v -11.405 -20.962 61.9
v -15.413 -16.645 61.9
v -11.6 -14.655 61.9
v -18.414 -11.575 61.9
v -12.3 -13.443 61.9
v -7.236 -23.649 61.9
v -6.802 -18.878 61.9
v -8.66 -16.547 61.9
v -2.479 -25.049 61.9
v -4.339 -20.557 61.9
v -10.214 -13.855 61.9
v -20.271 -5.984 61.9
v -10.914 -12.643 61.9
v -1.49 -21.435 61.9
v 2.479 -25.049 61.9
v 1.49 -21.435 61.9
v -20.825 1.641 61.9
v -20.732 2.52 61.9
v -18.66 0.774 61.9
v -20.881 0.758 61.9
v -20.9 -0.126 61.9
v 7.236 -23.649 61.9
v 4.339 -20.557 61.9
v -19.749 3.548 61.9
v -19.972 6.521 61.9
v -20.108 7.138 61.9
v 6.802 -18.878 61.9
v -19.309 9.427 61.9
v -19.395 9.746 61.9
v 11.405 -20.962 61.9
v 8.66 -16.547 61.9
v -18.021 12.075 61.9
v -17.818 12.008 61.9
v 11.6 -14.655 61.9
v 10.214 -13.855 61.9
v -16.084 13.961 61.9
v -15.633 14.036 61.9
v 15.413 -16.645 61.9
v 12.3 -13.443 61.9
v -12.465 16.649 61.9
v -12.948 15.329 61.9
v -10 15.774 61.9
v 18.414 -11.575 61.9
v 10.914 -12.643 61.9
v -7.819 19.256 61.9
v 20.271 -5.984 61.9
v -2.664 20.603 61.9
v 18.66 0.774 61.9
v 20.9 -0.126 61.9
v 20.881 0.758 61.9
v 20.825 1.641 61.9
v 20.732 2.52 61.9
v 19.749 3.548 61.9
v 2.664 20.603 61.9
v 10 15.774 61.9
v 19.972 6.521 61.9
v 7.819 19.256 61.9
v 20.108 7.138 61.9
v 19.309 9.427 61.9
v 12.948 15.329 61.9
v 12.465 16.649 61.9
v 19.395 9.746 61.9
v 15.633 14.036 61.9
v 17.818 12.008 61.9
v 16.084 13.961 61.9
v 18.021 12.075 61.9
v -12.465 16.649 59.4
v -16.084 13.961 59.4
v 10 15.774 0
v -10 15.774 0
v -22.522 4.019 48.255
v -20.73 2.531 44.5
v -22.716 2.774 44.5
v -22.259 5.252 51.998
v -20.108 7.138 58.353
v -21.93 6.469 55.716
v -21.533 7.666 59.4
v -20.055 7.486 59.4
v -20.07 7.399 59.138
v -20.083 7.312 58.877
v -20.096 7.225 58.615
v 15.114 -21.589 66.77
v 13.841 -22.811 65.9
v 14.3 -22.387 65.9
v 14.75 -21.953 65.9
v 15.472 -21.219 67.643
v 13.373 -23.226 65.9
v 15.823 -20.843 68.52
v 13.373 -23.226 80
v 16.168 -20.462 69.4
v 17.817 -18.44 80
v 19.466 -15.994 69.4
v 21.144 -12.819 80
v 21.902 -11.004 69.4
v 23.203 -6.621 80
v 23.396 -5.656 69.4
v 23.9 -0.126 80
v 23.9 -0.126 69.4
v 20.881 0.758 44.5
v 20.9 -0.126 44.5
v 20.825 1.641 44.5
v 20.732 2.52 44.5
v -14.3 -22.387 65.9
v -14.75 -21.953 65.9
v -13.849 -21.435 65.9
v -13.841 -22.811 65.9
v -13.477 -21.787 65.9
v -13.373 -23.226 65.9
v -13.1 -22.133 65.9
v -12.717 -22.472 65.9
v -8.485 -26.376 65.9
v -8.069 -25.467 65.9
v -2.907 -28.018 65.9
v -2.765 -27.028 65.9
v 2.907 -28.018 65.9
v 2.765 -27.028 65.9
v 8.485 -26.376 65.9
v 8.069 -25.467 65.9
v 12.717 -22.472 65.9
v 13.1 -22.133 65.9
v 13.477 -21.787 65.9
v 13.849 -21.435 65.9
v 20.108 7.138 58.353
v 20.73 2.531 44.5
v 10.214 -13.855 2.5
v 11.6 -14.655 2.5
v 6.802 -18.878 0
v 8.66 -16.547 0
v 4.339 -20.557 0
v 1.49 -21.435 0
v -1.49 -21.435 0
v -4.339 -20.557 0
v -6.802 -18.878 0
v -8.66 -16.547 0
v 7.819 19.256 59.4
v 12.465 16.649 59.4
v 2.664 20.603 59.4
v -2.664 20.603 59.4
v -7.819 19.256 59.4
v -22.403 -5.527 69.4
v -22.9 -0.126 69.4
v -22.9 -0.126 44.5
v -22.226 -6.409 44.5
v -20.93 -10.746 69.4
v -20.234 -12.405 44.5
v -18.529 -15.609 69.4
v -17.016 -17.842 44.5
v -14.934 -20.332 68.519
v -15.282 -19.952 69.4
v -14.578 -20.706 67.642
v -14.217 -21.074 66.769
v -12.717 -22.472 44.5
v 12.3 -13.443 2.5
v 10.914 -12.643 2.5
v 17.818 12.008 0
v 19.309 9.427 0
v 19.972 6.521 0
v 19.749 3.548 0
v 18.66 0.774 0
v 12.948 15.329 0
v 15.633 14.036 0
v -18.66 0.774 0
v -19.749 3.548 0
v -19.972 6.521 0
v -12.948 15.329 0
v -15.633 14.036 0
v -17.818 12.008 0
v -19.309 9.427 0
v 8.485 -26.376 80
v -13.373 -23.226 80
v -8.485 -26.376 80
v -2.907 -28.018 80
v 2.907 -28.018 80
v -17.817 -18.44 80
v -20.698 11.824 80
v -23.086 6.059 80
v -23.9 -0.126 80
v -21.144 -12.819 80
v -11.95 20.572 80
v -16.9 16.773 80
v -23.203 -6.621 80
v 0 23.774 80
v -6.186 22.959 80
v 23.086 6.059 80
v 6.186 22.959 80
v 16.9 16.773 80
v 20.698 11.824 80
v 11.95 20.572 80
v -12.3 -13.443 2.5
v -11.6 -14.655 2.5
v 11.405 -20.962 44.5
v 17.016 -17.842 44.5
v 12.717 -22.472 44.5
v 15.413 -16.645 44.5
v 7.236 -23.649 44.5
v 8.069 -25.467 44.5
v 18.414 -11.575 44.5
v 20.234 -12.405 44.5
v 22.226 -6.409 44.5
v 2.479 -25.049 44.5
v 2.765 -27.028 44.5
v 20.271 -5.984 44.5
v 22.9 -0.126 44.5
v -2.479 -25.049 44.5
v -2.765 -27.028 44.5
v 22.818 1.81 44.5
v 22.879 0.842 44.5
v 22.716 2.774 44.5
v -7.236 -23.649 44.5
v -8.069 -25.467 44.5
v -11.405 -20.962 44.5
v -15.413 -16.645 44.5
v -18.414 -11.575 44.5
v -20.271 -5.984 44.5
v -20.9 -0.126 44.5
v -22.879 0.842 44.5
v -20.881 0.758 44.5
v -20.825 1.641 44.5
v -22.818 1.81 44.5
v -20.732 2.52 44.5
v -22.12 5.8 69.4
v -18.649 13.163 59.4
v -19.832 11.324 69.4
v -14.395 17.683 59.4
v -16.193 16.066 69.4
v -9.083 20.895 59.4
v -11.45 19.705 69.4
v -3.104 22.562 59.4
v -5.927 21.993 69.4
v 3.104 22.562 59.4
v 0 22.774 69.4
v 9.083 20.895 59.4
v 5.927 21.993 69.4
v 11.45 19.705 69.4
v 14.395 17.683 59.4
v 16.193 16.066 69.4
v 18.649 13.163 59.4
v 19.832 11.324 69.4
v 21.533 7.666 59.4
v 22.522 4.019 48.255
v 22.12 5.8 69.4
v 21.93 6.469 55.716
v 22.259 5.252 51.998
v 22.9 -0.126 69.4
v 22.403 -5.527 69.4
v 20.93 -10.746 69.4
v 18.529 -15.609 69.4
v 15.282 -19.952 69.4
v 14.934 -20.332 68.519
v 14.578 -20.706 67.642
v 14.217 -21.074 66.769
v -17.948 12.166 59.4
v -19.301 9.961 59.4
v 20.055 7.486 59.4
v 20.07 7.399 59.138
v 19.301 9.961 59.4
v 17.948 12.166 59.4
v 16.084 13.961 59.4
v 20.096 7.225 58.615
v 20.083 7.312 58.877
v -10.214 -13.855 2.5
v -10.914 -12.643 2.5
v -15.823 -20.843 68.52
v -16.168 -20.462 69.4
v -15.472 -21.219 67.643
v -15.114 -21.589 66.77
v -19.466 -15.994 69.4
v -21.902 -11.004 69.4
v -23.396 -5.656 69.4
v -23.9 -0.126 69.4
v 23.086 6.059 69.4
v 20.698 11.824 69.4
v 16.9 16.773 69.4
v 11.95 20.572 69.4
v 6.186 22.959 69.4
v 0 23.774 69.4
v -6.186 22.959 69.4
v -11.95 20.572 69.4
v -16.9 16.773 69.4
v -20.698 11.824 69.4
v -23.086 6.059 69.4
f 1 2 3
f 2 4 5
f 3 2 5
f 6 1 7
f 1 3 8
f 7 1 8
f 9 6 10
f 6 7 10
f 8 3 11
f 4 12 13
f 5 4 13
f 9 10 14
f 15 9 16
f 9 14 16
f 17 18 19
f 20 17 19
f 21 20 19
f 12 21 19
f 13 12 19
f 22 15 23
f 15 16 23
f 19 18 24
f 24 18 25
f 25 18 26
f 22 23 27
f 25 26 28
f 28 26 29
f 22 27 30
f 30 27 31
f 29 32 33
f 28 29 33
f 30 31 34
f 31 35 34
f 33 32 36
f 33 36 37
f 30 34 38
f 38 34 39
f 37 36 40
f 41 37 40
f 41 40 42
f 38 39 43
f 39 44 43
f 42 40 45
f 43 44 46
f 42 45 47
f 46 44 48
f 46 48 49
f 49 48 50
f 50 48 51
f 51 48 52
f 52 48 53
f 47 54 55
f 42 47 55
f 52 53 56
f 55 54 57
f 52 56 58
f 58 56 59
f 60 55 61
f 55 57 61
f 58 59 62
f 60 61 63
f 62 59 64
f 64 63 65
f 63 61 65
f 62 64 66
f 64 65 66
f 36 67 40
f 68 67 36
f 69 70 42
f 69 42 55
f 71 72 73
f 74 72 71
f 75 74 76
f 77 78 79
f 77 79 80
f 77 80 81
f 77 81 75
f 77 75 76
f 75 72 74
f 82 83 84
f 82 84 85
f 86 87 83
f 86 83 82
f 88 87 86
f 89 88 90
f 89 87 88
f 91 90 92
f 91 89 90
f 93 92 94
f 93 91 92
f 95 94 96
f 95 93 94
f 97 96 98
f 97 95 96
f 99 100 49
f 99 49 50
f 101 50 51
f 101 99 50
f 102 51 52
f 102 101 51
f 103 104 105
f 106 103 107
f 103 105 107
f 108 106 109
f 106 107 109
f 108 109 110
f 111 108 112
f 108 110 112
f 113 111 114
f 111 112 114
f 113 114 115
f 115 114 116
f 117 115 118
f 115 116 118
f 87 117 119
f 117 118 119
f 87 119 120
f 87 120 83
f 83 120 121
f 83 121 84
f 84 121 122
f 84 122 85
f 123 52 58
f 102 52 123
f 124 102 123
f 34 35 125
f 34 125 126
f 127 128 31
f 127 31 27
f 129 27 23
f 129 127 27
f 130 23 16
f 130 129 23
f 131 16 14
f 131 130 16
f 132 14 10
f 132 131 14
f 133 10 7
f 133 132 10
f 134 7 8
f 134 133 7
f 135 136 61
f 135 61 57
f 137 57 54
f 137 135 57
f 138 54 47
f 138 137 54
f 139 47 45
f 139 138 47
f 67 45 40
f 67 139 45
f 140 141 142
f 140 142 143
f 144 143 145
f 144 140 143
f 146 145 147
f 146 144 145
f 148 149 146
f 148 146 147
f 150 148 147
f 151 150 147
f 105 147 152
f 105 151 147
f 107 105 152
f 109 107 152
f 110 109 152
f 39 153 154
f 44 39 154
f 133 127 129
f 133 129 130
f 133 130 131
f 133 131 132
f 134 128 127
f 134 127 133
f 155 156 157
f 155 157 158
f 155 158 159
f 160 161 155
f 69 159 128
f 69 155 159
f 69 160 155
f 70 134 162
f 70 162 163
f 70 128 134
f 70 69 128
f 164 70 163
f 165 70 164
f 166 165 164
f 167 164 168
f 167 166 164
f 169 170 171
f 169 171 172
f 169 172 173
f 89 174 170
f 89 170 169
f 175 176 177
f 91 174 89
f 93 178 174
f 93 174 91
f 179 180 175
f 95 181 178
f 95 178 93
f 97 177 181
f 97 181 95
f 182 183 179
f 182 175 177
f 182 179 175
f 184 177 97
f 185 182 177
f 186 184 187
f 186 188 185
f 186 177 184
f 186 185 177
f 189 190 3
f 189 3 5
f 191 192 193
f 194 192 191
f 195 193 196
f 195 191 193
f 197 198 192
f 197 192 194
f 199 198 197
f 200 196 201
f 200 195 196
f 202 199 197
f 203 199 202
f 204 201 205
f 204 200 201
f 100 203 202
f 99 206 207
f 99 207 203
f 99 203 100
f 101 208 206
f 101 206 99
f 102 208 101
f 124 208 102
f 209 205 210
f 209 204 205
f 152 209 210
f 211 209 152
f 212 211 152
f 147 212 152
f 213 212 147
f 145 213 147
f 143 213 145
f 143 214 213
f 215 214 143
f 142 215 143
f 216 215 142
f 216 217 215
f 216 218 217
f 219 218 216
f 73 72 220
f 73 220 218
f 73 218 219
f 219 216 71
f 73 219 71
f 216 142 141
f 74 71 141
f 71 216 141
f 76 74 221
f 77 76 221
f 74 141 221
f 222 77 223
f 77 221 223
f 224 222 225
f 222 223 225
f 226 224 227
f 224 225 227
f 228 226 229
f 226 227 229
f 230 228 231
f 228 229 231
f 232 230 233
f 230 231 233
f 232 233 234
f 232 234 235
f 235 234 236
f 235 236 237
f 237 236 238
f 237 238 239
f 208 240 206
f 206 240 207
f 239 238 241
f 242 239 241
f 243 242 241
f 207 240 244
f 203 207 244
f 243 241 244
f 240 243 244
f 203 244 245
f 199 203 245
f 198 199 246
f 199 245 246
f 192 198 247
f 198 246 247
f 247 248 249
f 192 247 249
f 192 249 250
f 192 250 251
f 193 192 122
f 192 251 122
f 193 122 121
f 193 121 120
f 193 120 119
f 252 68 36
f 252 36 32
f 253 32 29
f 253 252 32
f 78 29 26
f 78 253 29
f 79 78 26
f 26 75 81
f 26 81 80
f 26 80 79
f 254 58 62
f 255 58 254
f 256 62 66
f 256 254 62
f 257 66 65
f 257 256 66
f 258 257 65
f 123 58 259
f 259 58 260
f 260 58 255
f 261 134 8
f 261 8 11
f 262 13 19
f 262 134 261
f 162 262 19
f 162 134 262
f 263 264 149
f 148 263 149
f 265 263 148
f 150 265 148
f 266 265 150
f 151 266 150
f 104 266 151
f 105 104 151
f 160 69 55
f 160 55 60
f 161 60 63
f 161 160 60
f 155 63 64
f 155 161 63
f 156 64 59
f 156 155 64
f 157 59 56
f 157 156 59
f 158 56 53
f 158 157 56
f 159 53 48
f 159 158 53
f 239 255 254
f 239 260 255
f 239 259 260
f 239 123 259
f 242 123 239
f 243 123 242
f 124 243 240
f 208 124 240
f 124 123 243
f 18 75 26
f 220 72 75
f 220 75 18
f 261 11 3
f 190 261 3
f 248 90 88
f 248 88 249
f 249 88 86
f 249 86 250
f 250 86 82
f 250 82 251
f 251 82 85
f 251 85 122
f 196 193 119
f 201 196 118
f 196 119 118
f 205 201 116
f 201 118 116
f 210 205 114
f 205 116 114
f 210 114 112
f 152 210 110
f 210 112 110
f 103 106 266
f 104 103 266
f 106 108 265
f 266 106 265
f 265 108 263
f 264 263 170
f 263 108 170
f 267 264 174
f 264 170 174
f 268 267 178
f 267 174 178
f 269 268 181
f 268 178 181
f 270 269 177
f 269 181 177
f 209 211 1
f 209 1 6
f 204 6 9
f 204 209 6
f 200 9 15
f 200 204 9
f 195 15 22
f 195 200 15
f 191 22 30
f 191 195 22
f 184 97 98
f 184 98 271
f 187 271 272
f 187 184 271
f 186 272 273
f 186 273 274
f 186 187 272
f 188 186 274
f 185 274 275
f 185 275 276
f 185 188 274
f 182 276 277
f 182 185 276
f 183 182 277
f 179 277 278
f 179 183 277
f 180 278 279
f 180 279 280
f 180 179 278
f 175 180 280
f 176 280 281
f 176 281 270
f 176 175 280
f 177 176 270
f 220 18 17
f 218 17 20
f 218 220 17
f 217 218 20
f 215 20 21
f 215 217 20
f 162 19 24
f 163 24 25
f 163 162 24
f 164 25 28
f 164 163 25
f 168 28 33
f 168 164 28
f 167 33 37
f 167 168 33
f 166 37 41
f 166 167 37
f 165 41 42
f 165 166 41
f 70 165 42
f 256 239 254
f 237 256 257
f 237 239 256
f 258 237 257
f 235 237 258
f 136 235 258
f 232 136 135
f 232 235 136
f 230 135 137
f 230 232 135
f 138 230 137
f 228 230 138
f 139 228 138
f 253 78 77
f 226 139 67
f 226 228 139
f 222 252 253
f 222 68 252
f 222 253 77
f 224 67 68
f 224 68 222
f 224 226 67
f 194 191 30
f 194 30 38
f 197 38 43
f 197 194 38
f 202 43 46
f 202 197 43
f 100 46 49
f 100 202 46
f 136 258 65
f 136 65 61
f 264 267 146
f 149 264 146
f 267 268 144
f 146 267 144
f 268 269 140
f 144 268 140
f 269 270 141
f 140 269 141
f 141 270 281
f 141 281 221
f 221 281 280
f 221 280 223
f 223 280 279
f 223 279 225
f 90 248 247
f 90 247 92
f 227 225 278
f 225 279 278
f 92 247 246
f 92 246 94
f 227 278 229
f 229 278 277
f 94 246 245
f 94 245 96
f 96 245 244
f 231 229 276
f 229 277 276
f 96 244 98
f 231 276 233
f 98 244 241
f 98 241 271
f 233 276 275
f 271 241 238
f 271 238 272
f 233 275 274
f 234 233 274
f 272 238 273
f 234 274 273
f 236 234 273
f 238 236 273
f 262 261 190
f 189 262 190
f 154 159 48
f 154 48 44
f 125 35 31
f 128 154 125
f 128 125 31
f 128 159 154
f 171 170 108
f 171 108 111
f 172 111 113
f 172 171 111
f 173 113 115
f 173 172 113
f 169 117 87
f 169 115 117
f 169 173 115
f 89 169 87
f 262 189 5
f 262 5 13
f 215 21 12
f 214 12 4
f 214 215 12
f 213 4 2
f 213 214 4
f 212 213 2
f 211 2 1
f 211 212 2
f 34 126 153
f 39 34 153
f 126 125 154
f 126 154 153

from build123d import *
from OCP.BRepFilletAPI import BRepFilletAPI_MakeChamfer

# Parameters (mm, degrees)
BOSS_EXTRU_1_DEPTH      = 80
BOSS_EXTRU_2_DEPTH      = 10.6
BOSS_EXTRU_3_DEPTH      = 10
BOSS_EXTRU_4_DEPTH      = 3.5
CHANFREIN1_SIZE         = 2
CHANFREIN1_SIZE_2       = 3.5
BOSS_EXTRU_5_DEPTH      = 14.9
CHANFREIN2_SIZE         = 5
CHANFREIN2_SIZE_2       = 14.9
ENL_V_MAT_EXTRU_1_DEPTH = 61.9
BOSS_EXTRU_8_REACH      = 92.636
BOSS_EXTRU_8_START      = -2.5


with BuildPart() as part:
    # Esquisse1 → Boss.-Extru.1 (new body)
    with BuildSketch(Plane.XY):
        with BuildLine():
            Line((-9.999999999999973, 15.773502691896244), (9.999999999999973, 15.773502691896244))
            ThreePointArc((9.999999999999973, 15.773502691896244), (18.66025403784436, 10.773502691896228), (18.66025403784438, 0.7735026918962024))
            Line((18.66025403784438, 0.7735026918962024), (8.660254037844393, -16.54700538379251))
            ThreePointArc((8.660254037844393, -16.54700538379251), (-4.87e-15, -21.5470053837925), (-8.660254037844393, -16.54700538379251))
            Line((-8.660254037844393, -16.54700538379251), (-18.66025403784438, 0.7735026918962024))
            ThreePointArc((-18.66025403784438, 0.7735026918962024), (-18.66025403784441, 10.773502691896235), (-9.999999999999973, 15.773502691896244))
        make_face()
    extrude(amount=BOSS_EXTRU_1_DEPTH)

    # Esquisse2 → Boss.-Extru.2 (add)
    with BuildSketch(Plane.XY.offset(80)):
        with BuildLine():
            Line((0, 23.773502691896258), (0, -28.226497308103742))
            ThreePointArc((0, -28.226497308103742), (-7.138520611844601, -26.935621886911633), (-13.372879499304581, -23.22649730810374))
            ThreePointArc((-13.372879499304581, -23.22649730810374), (-21.14415675858487, -12.819312855059437), (-23.89999999999999, -0.12649730810374363))
            ThreePointArc((-23.89999999999999, -0.12649730810374363), (-16.89985207035848, 16.773354762254744), (0, 23.773502691896258))
        make_face()
    boss_extru_2 = extrude(amount=-BOSS_EXTRU_2_DEPTH)

    # Symétrie1: Boss.-Extru.2 across plane
    add(boss_extru_2.mirror(Plane(origin=(0, 0, 0), x_dir=(0, 0, 1), z_dir=(1, 0, 0))))

    # Esquisse4 → Boss.-Extru.3 (add)
    with BuildSketch(Plane(origin=(0, 0, 69.4), x_dir=(-1, 0, 0), z_dir=(0, 0, -1))):
        with BuildLine():
            ThreePointArc((-12.716812029717252, -22.471795065262707), (-2.04e-15, -27.226497308103735), (12.71681202971725, -22.4717950652627))
            ThreePointArc((12.71681202971725, -22.4717950652627), (20.2341931687673, -12.404624700892555), (22.899999999999995, -0.12649730810373652))
            ThreePointArc((22.899999999999995, -0.12649730810373652), (-6.91e-15, 22.773502691896258), (-22.899999999999995, -0.12649730810373735))
            ThreePointArc((-22.899999999999995, -0.12649730810373735), (-20.234193168767305, -12.404624700892553), (-12.716812029717252, -22.471795065262707))
        make_face()
    extrude(amount=BOSS_EXTRU_3_DEPTH)

    # Esquisse6 → Boss.-Extru.4 (add)
    with BuildSketch(Plane(origin=(0, 0, 69.4), x_dir=(-1, 0, 0), z_dir=(0, 0, -1))):
        with BuildLine():
            Line((14.75, -21.95321690393977), (0, -13.476497308103742))
            Line((0, -13.476497308103742), (0, -28.226497308103742))
            ThreePointArc((0, -28.226497308103742), (7.138520611844594, -26.935621886911633), (13.372879499304576, -23.226497308103735))
            ThreePointArc((13.372879499304576, -23.226497308103735), (14.071194795630928, -22.600407707254973), (14.75, -21.95321690393977))
        make_face()
    boss_extru_4 = extrude(amount=BOSS_EXTRU_4_DEPTH)

    # Symétrie2: Boss.-Extru.4 across plane
    add(boss_extru_4.mirror(Plane(origin=(0, 0, 0), x_dir=(0, 0, 1), z_dir=(1, 0, 0))))

    # Chanfrein1
    chanfrein1_edges_1 = [part.edges().sort_by_distance(p)[0] for p in [
        (-14.299309891443901, -21.69420851920438, 69.4),
    ]]
    chanfrein1_side_1 = [part.faces().sort_by_distance(p)[0] for p in [
        (-14.319240730556658, -21.659527664943543, 69.4),
    ]]
    chanfrein1_edges_2 = [part.edges().sort_by_distance(p)[0] for p in [
        (14.299309891443906, -21.694208519204384, 69.4),
    ]]
    chanfrein1_side_2 = [part.faces().sort_by_distance(p)[0] for p in [
        (14.319240730556663, -21.659527664943546, 69.4),
    ]]
    chanfrein1 = BRepFilletAPI_MakeChamfer(part.part.solid().wrapped)
    for e in chanfrein1_edges_1:
        chanfrein1.Add(CHANFREIN1_SIZE - 0.0001, CHANFREIN1_SIZE_2 - 0.0001, e.wrapped, chanfrein1_side_1[0].wrapped)
    for e in chanfrein1_edges_2:
        chanfrein1.Add(CHANFREIN1_SIZE - 0.0001, CHANFREIN1_SIZE_2 - 0.0001, e.wrapped, chanfrein1_side_2[0].wrapped)
    add(Compound.cast(chanfrein1.Shape()), mode=Mode.REPLACE)  # a hair under: the kernel refuses the full size

    # Esquisse7 → Boss.-Extru.5 (add)
    with BuildSketch(Plane(origin=(0, 0, 59.4), x_dir=(-1, 0, 0), z_dir=(0, 0, -1))):
        with BuildLine():
            Line((-6.79e-15, -27.22649730810374), (0, 0))
            Line((0, 0), (22.71563338320109, 2.7735026918962267))
            ThreePointArc((22.71563338320109, 2.7735026918962267), (22.853861867037974, 1.3264299999015228), (22.899999999999995, -0.12649730810374016))
            ThreePointArc((22.899999999999995, -0.12649730810374016), (20.2341931687673, -12.404624700892562), (12.716812029717245, -22.471795065262707))
            ThreePointArc((12.716812029717245, -22.471795065262707), (6.788307992740876, -25.998951656029643), (-6.79e-15, -27.22649730810374))
        make_face()
    boss_extru_5 = extrude(amount=BOSS_EXTRU_5_DEPTH)

    # Symétrie4: Boss.-Extru.5 across plane
    add(boss_extru_5.mirror(Plane(origin=(0, 0, 0), x_dir=(0, 0, 1), z_dir=(1, 0, 0))))

    # Chanfrein2
    chanfrein2_edges_1 = [part.edges().sort_by_distance(p)[0] for p in [
        (21.059128460282075, 2.5712489935136453, 59.4),
    ]]
    chanfrein2_side_1 = [part.faces().sort_by_distance(p)[0] for p in [
        (21.04700879877706, 2.6705118456034573, 59.4),
    ]]
    chanfrein2_edges_2 = [part.edges().sort_by_distance(p)[0] for p in [
        (-21.059128460282082, 2.571248993513646, 59.4),
    ]]
    chanfrein2_side_2 = [part.faces().sort_by_distance(p)[0] for p in [
        (-21.059128460282082, 2.571248993513646, 59.3),
    ]]
    chanfrein2 = BRepFilletAPI_MakeChamfer(part.part.solid().wrapped)
    for e in chanfrein2_edges_1:
        chanfrein2.Add(CHANFREIN2_SIZE - 0.0001, CHANFREIN2_SIZE_2 - 0.0001, e.wrapped, chanfrein2_side_1[0].wrapped)
    for e in chanfrein2_edges_2:
        chanfrein2.Add(CHANFREIN2_SIZE_2 - 0.0001, CHANFREIN2_SIZE - 0.0001, e.wrapped, chanfrein2_side_2[0].wrapped)
    add(Compound.cast(chanfrein2.Shape()), mode=Mode.REPLACE)  # a hair under: the kernel refuses the full size

    # Esquisse8 → Enlèv. mat.-Extru.1 (cut)
    with BuildSketch(Plane(origin=(0, 0, 0), x_dir=(-1, 0, 0), z_dir=(0, 0, -1))):
        with BuildLine():
            Line((-20.73173527113113, 2.5202275827259273), (-20.108299540895768, 7.138156637600371))
            ThreePointArc((-20.108299540895768, 7.138156637600371), (-18.785258977060302, 10.95609130242486), (-16.08354229758742, 13.96071913666333))
            Line((-16.08354229758742, 13.96071913666333), (-12.465297452899778, 16.64926972087978))
            ThreePointArc((-12.465297452899778, 16.64926972087978), (8.34e-15, 20.773502691896244), (12.465297452899788, 16.649269720879765))
            Line((12.465297452899788, 16.649269720879765), (16.083542297587456, 13.96071913666329))
            ThreePointArc((16.083542297587456, 13.96071913666329), (18.78525897706036, 10.956091302424788), (20.108299540895814, 7.13815663760026))
            Line((20.108299540895814, 7.13815663760026), (20.73173527113112, 2.5202275827259264))
            ThreePointArc((20.73173527113112, 2.5202275827259264), (20.857891398301028, 1.1995367852285772), (20.89999999999999, -0.12649730810373677))
            ThreePointArc((20.89999999999999, -0.12649730810373677), (18.414265989132176, -11.5752483925588), (11.404677090542576, -20.962390579580656))
            ThreePointArc((11.404677090542576, -20.962390579580656), (1.69e-15, -25.226497308103735), (-11.40467709054258, -20.962390579580664))
            ThreePointArc((-11.40467709054258, -20.962390579580664), (-18.414265989132176, -11.575248392558798), (-20.89999999999999, -0.1264973081037376))
            ThreePointArc((-20.89999999999999, -0.1264973081037376), (-20.85789139830103, 1.1995367852285768), (-20.73173527113113, 2.5202275827259273))
        make_face()
        with BuildLine():
            Line((-18.66025403784436, 0.773502691896218), (-8.660254037844393, -16.54700538379251))
            ThreePointArc((-8.660254037844393, -16.54700538379251), (6.09e-15, -21.547005383792524), (8.660254037844393, -16.54700538379251))
            Line((8.660254037844393, -16.54700538379251), (18.66025403784438, 0.7735026918962024))
            ThreePointArc((18.66025403784438, 0.7735026918962024), (18.66025403784438, 10.773502691896217), (9.999999999999973, 15.773502691896226))
            Line((9.999999999999973, 15.773502691896226), (-9.999999999999973, 15.773502691896244))
            ThreePointArc((-9.999999999999973, 15.773502691896244), (-18.660254037844357, 10.77350269189623), (-18.66025403784436, 0.773502691896218))
        make_face(mode=Mode.SUBTRACT)
    extrude(amount=-ENL_V_MAT_EXTRU_1_DEPTH, mode=Mode.SUBTRACT)

    # Esquisse9 → Boss.-Extru.8 (add, up to next)
    with BuildSketch(Plane(origin=(0, 0, 0), x_dir=(-1, 0, 0), z_dir=(0, 0, -1)).offset(BOSS_EXTRU_8_START), mode=Mode.PRIVATE) as boss_extru_8_sk1:
        Polygon((-10.214359353944898, -13.855216015993522), (-11.599999999999998, -14.655216015993522), (-12.3, -13.442780450695311), (-10.914359353944906, -12.642780450695314), align=None)
    boss_extru_8_tool1 = extrude(boss_extru_8_sk1.sketch, amount=-BOSS_EXTRU_8_REACH, mode=Mode.PRIVATE) - part.part
    # Esquisse9 → Boss.-Extru.8 (add, up to next)
    with BuildSketch(Plane(origin=(0, 0, 0), x_dir=(-1, 0, 0), z_dir=(0, 0, -1)).offset(BOSS_EXTRU_8_START), mode=Mode.PRIVATE) as boss_extru_8_sk2:
        Polygon((10.914359353944906, -12.642780450695314), (10.214359353944898, -13.855216015993522), (11.599999999999998, -14.655216015993522), (12.3, -13.442780450695311), align=None)
    boss_extru_8_tool2 = extrude(boss_extru_8_sk2.sketch, amount=-BOSS_EXTRU_8_REACH, mode=Mode.PRIVATE) - part.part
    add(boss_extru_8_tool1.solids().sort_by_distance((11.25718, -13.648998, 2.5))[0])
    add(boss_extru_8_tool2.solids().sort_by_distance((-11.25718, -13.648998, 2.5))[0])


solid = part.part
